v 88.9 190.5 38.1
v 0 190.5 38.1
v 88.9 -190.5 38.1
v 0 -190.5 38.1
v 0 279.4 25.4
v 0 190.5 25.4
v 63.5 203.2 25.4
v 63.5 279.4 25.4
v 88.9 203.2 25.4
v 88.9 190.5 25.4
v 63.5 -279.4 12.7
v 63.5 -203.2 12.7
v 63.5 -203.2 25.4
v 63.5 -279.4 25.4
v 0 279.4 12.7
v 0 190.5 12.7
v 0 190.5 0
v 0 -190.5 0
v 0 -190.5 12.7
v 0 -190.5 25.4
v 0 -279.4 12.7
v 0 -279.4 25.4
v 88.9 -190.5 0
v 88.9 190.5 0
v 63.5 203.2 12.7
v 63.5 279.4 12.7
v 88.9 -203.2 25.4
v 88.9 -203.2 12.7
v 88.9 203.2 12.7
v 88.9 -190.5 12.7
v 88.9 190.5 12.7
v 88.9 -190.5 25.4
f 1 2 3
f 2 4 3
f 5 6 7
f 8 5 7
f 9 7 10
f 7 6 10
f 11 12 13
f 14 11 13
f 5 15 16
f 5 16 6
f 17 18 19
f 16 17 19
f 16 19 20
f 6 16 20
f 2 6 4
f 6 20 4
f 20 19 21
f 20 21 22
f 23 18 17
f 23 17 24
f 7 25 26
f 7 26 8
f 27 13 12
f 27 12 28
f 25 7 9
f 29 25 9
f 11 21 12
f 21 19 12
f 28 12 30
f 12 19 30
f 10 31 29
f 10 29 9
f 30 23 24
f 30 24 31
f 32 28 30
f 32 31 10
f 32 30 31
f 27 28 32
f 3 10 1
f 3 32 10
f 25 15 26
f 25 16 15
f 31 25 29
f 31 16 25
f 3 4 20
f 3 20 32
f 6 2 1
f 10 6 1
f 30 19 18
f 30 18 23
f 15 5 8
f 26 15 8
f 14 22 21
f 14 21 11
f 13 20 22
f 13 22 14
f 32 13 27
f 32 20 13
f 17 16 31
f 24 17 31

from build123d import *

# Parameters (mm, degrees)
F0_W     = 88.9
F0_H     = 38.1
F1_DEPTH = 190.5
F2_W     = 88.9
F2_H     = 12.7
F3_DEPTH = 12.7
F4_W     = 63.5
F4_H     = 12.7
F5_DEPTH = 76.2


with BuildPart() as f1:
    # F0 (on Front) → F1 (new body)
    with BuildSketch(Plane.XZ):
        with Locations((44.45, 19.05)):
            Rectangle(F0_W, F0_H)
    extrude(amount=F1_DEPTH)

    # F2 (on face) → F3 (join)
    with BuildSketch(Plane.XZ.offset(190.5)):
        with Locations((44.45, 19.05)):
            Rectangle(F2_W, F2_H)
    extrude(amount=F3_DEPTH)

    # F4 (on face) → F5 (join)
    with BuildSketch(Plane.XZ.offset(203.2)):
        with Locations((31.75, 19.05)):
            Rectangle(F4_W, F4_H)
    extrude(amount=F5_DEPTH)

    # F6: F1 across face


with BuildPart() as f1_1:
    add(f1.part)
    add(f1.part.mirror(Plane(origin=(44.45, 0, 19.05), x_dir=(1, 0, 0), z_dir=(0, 1, 0))))


solid = f1_1.part
